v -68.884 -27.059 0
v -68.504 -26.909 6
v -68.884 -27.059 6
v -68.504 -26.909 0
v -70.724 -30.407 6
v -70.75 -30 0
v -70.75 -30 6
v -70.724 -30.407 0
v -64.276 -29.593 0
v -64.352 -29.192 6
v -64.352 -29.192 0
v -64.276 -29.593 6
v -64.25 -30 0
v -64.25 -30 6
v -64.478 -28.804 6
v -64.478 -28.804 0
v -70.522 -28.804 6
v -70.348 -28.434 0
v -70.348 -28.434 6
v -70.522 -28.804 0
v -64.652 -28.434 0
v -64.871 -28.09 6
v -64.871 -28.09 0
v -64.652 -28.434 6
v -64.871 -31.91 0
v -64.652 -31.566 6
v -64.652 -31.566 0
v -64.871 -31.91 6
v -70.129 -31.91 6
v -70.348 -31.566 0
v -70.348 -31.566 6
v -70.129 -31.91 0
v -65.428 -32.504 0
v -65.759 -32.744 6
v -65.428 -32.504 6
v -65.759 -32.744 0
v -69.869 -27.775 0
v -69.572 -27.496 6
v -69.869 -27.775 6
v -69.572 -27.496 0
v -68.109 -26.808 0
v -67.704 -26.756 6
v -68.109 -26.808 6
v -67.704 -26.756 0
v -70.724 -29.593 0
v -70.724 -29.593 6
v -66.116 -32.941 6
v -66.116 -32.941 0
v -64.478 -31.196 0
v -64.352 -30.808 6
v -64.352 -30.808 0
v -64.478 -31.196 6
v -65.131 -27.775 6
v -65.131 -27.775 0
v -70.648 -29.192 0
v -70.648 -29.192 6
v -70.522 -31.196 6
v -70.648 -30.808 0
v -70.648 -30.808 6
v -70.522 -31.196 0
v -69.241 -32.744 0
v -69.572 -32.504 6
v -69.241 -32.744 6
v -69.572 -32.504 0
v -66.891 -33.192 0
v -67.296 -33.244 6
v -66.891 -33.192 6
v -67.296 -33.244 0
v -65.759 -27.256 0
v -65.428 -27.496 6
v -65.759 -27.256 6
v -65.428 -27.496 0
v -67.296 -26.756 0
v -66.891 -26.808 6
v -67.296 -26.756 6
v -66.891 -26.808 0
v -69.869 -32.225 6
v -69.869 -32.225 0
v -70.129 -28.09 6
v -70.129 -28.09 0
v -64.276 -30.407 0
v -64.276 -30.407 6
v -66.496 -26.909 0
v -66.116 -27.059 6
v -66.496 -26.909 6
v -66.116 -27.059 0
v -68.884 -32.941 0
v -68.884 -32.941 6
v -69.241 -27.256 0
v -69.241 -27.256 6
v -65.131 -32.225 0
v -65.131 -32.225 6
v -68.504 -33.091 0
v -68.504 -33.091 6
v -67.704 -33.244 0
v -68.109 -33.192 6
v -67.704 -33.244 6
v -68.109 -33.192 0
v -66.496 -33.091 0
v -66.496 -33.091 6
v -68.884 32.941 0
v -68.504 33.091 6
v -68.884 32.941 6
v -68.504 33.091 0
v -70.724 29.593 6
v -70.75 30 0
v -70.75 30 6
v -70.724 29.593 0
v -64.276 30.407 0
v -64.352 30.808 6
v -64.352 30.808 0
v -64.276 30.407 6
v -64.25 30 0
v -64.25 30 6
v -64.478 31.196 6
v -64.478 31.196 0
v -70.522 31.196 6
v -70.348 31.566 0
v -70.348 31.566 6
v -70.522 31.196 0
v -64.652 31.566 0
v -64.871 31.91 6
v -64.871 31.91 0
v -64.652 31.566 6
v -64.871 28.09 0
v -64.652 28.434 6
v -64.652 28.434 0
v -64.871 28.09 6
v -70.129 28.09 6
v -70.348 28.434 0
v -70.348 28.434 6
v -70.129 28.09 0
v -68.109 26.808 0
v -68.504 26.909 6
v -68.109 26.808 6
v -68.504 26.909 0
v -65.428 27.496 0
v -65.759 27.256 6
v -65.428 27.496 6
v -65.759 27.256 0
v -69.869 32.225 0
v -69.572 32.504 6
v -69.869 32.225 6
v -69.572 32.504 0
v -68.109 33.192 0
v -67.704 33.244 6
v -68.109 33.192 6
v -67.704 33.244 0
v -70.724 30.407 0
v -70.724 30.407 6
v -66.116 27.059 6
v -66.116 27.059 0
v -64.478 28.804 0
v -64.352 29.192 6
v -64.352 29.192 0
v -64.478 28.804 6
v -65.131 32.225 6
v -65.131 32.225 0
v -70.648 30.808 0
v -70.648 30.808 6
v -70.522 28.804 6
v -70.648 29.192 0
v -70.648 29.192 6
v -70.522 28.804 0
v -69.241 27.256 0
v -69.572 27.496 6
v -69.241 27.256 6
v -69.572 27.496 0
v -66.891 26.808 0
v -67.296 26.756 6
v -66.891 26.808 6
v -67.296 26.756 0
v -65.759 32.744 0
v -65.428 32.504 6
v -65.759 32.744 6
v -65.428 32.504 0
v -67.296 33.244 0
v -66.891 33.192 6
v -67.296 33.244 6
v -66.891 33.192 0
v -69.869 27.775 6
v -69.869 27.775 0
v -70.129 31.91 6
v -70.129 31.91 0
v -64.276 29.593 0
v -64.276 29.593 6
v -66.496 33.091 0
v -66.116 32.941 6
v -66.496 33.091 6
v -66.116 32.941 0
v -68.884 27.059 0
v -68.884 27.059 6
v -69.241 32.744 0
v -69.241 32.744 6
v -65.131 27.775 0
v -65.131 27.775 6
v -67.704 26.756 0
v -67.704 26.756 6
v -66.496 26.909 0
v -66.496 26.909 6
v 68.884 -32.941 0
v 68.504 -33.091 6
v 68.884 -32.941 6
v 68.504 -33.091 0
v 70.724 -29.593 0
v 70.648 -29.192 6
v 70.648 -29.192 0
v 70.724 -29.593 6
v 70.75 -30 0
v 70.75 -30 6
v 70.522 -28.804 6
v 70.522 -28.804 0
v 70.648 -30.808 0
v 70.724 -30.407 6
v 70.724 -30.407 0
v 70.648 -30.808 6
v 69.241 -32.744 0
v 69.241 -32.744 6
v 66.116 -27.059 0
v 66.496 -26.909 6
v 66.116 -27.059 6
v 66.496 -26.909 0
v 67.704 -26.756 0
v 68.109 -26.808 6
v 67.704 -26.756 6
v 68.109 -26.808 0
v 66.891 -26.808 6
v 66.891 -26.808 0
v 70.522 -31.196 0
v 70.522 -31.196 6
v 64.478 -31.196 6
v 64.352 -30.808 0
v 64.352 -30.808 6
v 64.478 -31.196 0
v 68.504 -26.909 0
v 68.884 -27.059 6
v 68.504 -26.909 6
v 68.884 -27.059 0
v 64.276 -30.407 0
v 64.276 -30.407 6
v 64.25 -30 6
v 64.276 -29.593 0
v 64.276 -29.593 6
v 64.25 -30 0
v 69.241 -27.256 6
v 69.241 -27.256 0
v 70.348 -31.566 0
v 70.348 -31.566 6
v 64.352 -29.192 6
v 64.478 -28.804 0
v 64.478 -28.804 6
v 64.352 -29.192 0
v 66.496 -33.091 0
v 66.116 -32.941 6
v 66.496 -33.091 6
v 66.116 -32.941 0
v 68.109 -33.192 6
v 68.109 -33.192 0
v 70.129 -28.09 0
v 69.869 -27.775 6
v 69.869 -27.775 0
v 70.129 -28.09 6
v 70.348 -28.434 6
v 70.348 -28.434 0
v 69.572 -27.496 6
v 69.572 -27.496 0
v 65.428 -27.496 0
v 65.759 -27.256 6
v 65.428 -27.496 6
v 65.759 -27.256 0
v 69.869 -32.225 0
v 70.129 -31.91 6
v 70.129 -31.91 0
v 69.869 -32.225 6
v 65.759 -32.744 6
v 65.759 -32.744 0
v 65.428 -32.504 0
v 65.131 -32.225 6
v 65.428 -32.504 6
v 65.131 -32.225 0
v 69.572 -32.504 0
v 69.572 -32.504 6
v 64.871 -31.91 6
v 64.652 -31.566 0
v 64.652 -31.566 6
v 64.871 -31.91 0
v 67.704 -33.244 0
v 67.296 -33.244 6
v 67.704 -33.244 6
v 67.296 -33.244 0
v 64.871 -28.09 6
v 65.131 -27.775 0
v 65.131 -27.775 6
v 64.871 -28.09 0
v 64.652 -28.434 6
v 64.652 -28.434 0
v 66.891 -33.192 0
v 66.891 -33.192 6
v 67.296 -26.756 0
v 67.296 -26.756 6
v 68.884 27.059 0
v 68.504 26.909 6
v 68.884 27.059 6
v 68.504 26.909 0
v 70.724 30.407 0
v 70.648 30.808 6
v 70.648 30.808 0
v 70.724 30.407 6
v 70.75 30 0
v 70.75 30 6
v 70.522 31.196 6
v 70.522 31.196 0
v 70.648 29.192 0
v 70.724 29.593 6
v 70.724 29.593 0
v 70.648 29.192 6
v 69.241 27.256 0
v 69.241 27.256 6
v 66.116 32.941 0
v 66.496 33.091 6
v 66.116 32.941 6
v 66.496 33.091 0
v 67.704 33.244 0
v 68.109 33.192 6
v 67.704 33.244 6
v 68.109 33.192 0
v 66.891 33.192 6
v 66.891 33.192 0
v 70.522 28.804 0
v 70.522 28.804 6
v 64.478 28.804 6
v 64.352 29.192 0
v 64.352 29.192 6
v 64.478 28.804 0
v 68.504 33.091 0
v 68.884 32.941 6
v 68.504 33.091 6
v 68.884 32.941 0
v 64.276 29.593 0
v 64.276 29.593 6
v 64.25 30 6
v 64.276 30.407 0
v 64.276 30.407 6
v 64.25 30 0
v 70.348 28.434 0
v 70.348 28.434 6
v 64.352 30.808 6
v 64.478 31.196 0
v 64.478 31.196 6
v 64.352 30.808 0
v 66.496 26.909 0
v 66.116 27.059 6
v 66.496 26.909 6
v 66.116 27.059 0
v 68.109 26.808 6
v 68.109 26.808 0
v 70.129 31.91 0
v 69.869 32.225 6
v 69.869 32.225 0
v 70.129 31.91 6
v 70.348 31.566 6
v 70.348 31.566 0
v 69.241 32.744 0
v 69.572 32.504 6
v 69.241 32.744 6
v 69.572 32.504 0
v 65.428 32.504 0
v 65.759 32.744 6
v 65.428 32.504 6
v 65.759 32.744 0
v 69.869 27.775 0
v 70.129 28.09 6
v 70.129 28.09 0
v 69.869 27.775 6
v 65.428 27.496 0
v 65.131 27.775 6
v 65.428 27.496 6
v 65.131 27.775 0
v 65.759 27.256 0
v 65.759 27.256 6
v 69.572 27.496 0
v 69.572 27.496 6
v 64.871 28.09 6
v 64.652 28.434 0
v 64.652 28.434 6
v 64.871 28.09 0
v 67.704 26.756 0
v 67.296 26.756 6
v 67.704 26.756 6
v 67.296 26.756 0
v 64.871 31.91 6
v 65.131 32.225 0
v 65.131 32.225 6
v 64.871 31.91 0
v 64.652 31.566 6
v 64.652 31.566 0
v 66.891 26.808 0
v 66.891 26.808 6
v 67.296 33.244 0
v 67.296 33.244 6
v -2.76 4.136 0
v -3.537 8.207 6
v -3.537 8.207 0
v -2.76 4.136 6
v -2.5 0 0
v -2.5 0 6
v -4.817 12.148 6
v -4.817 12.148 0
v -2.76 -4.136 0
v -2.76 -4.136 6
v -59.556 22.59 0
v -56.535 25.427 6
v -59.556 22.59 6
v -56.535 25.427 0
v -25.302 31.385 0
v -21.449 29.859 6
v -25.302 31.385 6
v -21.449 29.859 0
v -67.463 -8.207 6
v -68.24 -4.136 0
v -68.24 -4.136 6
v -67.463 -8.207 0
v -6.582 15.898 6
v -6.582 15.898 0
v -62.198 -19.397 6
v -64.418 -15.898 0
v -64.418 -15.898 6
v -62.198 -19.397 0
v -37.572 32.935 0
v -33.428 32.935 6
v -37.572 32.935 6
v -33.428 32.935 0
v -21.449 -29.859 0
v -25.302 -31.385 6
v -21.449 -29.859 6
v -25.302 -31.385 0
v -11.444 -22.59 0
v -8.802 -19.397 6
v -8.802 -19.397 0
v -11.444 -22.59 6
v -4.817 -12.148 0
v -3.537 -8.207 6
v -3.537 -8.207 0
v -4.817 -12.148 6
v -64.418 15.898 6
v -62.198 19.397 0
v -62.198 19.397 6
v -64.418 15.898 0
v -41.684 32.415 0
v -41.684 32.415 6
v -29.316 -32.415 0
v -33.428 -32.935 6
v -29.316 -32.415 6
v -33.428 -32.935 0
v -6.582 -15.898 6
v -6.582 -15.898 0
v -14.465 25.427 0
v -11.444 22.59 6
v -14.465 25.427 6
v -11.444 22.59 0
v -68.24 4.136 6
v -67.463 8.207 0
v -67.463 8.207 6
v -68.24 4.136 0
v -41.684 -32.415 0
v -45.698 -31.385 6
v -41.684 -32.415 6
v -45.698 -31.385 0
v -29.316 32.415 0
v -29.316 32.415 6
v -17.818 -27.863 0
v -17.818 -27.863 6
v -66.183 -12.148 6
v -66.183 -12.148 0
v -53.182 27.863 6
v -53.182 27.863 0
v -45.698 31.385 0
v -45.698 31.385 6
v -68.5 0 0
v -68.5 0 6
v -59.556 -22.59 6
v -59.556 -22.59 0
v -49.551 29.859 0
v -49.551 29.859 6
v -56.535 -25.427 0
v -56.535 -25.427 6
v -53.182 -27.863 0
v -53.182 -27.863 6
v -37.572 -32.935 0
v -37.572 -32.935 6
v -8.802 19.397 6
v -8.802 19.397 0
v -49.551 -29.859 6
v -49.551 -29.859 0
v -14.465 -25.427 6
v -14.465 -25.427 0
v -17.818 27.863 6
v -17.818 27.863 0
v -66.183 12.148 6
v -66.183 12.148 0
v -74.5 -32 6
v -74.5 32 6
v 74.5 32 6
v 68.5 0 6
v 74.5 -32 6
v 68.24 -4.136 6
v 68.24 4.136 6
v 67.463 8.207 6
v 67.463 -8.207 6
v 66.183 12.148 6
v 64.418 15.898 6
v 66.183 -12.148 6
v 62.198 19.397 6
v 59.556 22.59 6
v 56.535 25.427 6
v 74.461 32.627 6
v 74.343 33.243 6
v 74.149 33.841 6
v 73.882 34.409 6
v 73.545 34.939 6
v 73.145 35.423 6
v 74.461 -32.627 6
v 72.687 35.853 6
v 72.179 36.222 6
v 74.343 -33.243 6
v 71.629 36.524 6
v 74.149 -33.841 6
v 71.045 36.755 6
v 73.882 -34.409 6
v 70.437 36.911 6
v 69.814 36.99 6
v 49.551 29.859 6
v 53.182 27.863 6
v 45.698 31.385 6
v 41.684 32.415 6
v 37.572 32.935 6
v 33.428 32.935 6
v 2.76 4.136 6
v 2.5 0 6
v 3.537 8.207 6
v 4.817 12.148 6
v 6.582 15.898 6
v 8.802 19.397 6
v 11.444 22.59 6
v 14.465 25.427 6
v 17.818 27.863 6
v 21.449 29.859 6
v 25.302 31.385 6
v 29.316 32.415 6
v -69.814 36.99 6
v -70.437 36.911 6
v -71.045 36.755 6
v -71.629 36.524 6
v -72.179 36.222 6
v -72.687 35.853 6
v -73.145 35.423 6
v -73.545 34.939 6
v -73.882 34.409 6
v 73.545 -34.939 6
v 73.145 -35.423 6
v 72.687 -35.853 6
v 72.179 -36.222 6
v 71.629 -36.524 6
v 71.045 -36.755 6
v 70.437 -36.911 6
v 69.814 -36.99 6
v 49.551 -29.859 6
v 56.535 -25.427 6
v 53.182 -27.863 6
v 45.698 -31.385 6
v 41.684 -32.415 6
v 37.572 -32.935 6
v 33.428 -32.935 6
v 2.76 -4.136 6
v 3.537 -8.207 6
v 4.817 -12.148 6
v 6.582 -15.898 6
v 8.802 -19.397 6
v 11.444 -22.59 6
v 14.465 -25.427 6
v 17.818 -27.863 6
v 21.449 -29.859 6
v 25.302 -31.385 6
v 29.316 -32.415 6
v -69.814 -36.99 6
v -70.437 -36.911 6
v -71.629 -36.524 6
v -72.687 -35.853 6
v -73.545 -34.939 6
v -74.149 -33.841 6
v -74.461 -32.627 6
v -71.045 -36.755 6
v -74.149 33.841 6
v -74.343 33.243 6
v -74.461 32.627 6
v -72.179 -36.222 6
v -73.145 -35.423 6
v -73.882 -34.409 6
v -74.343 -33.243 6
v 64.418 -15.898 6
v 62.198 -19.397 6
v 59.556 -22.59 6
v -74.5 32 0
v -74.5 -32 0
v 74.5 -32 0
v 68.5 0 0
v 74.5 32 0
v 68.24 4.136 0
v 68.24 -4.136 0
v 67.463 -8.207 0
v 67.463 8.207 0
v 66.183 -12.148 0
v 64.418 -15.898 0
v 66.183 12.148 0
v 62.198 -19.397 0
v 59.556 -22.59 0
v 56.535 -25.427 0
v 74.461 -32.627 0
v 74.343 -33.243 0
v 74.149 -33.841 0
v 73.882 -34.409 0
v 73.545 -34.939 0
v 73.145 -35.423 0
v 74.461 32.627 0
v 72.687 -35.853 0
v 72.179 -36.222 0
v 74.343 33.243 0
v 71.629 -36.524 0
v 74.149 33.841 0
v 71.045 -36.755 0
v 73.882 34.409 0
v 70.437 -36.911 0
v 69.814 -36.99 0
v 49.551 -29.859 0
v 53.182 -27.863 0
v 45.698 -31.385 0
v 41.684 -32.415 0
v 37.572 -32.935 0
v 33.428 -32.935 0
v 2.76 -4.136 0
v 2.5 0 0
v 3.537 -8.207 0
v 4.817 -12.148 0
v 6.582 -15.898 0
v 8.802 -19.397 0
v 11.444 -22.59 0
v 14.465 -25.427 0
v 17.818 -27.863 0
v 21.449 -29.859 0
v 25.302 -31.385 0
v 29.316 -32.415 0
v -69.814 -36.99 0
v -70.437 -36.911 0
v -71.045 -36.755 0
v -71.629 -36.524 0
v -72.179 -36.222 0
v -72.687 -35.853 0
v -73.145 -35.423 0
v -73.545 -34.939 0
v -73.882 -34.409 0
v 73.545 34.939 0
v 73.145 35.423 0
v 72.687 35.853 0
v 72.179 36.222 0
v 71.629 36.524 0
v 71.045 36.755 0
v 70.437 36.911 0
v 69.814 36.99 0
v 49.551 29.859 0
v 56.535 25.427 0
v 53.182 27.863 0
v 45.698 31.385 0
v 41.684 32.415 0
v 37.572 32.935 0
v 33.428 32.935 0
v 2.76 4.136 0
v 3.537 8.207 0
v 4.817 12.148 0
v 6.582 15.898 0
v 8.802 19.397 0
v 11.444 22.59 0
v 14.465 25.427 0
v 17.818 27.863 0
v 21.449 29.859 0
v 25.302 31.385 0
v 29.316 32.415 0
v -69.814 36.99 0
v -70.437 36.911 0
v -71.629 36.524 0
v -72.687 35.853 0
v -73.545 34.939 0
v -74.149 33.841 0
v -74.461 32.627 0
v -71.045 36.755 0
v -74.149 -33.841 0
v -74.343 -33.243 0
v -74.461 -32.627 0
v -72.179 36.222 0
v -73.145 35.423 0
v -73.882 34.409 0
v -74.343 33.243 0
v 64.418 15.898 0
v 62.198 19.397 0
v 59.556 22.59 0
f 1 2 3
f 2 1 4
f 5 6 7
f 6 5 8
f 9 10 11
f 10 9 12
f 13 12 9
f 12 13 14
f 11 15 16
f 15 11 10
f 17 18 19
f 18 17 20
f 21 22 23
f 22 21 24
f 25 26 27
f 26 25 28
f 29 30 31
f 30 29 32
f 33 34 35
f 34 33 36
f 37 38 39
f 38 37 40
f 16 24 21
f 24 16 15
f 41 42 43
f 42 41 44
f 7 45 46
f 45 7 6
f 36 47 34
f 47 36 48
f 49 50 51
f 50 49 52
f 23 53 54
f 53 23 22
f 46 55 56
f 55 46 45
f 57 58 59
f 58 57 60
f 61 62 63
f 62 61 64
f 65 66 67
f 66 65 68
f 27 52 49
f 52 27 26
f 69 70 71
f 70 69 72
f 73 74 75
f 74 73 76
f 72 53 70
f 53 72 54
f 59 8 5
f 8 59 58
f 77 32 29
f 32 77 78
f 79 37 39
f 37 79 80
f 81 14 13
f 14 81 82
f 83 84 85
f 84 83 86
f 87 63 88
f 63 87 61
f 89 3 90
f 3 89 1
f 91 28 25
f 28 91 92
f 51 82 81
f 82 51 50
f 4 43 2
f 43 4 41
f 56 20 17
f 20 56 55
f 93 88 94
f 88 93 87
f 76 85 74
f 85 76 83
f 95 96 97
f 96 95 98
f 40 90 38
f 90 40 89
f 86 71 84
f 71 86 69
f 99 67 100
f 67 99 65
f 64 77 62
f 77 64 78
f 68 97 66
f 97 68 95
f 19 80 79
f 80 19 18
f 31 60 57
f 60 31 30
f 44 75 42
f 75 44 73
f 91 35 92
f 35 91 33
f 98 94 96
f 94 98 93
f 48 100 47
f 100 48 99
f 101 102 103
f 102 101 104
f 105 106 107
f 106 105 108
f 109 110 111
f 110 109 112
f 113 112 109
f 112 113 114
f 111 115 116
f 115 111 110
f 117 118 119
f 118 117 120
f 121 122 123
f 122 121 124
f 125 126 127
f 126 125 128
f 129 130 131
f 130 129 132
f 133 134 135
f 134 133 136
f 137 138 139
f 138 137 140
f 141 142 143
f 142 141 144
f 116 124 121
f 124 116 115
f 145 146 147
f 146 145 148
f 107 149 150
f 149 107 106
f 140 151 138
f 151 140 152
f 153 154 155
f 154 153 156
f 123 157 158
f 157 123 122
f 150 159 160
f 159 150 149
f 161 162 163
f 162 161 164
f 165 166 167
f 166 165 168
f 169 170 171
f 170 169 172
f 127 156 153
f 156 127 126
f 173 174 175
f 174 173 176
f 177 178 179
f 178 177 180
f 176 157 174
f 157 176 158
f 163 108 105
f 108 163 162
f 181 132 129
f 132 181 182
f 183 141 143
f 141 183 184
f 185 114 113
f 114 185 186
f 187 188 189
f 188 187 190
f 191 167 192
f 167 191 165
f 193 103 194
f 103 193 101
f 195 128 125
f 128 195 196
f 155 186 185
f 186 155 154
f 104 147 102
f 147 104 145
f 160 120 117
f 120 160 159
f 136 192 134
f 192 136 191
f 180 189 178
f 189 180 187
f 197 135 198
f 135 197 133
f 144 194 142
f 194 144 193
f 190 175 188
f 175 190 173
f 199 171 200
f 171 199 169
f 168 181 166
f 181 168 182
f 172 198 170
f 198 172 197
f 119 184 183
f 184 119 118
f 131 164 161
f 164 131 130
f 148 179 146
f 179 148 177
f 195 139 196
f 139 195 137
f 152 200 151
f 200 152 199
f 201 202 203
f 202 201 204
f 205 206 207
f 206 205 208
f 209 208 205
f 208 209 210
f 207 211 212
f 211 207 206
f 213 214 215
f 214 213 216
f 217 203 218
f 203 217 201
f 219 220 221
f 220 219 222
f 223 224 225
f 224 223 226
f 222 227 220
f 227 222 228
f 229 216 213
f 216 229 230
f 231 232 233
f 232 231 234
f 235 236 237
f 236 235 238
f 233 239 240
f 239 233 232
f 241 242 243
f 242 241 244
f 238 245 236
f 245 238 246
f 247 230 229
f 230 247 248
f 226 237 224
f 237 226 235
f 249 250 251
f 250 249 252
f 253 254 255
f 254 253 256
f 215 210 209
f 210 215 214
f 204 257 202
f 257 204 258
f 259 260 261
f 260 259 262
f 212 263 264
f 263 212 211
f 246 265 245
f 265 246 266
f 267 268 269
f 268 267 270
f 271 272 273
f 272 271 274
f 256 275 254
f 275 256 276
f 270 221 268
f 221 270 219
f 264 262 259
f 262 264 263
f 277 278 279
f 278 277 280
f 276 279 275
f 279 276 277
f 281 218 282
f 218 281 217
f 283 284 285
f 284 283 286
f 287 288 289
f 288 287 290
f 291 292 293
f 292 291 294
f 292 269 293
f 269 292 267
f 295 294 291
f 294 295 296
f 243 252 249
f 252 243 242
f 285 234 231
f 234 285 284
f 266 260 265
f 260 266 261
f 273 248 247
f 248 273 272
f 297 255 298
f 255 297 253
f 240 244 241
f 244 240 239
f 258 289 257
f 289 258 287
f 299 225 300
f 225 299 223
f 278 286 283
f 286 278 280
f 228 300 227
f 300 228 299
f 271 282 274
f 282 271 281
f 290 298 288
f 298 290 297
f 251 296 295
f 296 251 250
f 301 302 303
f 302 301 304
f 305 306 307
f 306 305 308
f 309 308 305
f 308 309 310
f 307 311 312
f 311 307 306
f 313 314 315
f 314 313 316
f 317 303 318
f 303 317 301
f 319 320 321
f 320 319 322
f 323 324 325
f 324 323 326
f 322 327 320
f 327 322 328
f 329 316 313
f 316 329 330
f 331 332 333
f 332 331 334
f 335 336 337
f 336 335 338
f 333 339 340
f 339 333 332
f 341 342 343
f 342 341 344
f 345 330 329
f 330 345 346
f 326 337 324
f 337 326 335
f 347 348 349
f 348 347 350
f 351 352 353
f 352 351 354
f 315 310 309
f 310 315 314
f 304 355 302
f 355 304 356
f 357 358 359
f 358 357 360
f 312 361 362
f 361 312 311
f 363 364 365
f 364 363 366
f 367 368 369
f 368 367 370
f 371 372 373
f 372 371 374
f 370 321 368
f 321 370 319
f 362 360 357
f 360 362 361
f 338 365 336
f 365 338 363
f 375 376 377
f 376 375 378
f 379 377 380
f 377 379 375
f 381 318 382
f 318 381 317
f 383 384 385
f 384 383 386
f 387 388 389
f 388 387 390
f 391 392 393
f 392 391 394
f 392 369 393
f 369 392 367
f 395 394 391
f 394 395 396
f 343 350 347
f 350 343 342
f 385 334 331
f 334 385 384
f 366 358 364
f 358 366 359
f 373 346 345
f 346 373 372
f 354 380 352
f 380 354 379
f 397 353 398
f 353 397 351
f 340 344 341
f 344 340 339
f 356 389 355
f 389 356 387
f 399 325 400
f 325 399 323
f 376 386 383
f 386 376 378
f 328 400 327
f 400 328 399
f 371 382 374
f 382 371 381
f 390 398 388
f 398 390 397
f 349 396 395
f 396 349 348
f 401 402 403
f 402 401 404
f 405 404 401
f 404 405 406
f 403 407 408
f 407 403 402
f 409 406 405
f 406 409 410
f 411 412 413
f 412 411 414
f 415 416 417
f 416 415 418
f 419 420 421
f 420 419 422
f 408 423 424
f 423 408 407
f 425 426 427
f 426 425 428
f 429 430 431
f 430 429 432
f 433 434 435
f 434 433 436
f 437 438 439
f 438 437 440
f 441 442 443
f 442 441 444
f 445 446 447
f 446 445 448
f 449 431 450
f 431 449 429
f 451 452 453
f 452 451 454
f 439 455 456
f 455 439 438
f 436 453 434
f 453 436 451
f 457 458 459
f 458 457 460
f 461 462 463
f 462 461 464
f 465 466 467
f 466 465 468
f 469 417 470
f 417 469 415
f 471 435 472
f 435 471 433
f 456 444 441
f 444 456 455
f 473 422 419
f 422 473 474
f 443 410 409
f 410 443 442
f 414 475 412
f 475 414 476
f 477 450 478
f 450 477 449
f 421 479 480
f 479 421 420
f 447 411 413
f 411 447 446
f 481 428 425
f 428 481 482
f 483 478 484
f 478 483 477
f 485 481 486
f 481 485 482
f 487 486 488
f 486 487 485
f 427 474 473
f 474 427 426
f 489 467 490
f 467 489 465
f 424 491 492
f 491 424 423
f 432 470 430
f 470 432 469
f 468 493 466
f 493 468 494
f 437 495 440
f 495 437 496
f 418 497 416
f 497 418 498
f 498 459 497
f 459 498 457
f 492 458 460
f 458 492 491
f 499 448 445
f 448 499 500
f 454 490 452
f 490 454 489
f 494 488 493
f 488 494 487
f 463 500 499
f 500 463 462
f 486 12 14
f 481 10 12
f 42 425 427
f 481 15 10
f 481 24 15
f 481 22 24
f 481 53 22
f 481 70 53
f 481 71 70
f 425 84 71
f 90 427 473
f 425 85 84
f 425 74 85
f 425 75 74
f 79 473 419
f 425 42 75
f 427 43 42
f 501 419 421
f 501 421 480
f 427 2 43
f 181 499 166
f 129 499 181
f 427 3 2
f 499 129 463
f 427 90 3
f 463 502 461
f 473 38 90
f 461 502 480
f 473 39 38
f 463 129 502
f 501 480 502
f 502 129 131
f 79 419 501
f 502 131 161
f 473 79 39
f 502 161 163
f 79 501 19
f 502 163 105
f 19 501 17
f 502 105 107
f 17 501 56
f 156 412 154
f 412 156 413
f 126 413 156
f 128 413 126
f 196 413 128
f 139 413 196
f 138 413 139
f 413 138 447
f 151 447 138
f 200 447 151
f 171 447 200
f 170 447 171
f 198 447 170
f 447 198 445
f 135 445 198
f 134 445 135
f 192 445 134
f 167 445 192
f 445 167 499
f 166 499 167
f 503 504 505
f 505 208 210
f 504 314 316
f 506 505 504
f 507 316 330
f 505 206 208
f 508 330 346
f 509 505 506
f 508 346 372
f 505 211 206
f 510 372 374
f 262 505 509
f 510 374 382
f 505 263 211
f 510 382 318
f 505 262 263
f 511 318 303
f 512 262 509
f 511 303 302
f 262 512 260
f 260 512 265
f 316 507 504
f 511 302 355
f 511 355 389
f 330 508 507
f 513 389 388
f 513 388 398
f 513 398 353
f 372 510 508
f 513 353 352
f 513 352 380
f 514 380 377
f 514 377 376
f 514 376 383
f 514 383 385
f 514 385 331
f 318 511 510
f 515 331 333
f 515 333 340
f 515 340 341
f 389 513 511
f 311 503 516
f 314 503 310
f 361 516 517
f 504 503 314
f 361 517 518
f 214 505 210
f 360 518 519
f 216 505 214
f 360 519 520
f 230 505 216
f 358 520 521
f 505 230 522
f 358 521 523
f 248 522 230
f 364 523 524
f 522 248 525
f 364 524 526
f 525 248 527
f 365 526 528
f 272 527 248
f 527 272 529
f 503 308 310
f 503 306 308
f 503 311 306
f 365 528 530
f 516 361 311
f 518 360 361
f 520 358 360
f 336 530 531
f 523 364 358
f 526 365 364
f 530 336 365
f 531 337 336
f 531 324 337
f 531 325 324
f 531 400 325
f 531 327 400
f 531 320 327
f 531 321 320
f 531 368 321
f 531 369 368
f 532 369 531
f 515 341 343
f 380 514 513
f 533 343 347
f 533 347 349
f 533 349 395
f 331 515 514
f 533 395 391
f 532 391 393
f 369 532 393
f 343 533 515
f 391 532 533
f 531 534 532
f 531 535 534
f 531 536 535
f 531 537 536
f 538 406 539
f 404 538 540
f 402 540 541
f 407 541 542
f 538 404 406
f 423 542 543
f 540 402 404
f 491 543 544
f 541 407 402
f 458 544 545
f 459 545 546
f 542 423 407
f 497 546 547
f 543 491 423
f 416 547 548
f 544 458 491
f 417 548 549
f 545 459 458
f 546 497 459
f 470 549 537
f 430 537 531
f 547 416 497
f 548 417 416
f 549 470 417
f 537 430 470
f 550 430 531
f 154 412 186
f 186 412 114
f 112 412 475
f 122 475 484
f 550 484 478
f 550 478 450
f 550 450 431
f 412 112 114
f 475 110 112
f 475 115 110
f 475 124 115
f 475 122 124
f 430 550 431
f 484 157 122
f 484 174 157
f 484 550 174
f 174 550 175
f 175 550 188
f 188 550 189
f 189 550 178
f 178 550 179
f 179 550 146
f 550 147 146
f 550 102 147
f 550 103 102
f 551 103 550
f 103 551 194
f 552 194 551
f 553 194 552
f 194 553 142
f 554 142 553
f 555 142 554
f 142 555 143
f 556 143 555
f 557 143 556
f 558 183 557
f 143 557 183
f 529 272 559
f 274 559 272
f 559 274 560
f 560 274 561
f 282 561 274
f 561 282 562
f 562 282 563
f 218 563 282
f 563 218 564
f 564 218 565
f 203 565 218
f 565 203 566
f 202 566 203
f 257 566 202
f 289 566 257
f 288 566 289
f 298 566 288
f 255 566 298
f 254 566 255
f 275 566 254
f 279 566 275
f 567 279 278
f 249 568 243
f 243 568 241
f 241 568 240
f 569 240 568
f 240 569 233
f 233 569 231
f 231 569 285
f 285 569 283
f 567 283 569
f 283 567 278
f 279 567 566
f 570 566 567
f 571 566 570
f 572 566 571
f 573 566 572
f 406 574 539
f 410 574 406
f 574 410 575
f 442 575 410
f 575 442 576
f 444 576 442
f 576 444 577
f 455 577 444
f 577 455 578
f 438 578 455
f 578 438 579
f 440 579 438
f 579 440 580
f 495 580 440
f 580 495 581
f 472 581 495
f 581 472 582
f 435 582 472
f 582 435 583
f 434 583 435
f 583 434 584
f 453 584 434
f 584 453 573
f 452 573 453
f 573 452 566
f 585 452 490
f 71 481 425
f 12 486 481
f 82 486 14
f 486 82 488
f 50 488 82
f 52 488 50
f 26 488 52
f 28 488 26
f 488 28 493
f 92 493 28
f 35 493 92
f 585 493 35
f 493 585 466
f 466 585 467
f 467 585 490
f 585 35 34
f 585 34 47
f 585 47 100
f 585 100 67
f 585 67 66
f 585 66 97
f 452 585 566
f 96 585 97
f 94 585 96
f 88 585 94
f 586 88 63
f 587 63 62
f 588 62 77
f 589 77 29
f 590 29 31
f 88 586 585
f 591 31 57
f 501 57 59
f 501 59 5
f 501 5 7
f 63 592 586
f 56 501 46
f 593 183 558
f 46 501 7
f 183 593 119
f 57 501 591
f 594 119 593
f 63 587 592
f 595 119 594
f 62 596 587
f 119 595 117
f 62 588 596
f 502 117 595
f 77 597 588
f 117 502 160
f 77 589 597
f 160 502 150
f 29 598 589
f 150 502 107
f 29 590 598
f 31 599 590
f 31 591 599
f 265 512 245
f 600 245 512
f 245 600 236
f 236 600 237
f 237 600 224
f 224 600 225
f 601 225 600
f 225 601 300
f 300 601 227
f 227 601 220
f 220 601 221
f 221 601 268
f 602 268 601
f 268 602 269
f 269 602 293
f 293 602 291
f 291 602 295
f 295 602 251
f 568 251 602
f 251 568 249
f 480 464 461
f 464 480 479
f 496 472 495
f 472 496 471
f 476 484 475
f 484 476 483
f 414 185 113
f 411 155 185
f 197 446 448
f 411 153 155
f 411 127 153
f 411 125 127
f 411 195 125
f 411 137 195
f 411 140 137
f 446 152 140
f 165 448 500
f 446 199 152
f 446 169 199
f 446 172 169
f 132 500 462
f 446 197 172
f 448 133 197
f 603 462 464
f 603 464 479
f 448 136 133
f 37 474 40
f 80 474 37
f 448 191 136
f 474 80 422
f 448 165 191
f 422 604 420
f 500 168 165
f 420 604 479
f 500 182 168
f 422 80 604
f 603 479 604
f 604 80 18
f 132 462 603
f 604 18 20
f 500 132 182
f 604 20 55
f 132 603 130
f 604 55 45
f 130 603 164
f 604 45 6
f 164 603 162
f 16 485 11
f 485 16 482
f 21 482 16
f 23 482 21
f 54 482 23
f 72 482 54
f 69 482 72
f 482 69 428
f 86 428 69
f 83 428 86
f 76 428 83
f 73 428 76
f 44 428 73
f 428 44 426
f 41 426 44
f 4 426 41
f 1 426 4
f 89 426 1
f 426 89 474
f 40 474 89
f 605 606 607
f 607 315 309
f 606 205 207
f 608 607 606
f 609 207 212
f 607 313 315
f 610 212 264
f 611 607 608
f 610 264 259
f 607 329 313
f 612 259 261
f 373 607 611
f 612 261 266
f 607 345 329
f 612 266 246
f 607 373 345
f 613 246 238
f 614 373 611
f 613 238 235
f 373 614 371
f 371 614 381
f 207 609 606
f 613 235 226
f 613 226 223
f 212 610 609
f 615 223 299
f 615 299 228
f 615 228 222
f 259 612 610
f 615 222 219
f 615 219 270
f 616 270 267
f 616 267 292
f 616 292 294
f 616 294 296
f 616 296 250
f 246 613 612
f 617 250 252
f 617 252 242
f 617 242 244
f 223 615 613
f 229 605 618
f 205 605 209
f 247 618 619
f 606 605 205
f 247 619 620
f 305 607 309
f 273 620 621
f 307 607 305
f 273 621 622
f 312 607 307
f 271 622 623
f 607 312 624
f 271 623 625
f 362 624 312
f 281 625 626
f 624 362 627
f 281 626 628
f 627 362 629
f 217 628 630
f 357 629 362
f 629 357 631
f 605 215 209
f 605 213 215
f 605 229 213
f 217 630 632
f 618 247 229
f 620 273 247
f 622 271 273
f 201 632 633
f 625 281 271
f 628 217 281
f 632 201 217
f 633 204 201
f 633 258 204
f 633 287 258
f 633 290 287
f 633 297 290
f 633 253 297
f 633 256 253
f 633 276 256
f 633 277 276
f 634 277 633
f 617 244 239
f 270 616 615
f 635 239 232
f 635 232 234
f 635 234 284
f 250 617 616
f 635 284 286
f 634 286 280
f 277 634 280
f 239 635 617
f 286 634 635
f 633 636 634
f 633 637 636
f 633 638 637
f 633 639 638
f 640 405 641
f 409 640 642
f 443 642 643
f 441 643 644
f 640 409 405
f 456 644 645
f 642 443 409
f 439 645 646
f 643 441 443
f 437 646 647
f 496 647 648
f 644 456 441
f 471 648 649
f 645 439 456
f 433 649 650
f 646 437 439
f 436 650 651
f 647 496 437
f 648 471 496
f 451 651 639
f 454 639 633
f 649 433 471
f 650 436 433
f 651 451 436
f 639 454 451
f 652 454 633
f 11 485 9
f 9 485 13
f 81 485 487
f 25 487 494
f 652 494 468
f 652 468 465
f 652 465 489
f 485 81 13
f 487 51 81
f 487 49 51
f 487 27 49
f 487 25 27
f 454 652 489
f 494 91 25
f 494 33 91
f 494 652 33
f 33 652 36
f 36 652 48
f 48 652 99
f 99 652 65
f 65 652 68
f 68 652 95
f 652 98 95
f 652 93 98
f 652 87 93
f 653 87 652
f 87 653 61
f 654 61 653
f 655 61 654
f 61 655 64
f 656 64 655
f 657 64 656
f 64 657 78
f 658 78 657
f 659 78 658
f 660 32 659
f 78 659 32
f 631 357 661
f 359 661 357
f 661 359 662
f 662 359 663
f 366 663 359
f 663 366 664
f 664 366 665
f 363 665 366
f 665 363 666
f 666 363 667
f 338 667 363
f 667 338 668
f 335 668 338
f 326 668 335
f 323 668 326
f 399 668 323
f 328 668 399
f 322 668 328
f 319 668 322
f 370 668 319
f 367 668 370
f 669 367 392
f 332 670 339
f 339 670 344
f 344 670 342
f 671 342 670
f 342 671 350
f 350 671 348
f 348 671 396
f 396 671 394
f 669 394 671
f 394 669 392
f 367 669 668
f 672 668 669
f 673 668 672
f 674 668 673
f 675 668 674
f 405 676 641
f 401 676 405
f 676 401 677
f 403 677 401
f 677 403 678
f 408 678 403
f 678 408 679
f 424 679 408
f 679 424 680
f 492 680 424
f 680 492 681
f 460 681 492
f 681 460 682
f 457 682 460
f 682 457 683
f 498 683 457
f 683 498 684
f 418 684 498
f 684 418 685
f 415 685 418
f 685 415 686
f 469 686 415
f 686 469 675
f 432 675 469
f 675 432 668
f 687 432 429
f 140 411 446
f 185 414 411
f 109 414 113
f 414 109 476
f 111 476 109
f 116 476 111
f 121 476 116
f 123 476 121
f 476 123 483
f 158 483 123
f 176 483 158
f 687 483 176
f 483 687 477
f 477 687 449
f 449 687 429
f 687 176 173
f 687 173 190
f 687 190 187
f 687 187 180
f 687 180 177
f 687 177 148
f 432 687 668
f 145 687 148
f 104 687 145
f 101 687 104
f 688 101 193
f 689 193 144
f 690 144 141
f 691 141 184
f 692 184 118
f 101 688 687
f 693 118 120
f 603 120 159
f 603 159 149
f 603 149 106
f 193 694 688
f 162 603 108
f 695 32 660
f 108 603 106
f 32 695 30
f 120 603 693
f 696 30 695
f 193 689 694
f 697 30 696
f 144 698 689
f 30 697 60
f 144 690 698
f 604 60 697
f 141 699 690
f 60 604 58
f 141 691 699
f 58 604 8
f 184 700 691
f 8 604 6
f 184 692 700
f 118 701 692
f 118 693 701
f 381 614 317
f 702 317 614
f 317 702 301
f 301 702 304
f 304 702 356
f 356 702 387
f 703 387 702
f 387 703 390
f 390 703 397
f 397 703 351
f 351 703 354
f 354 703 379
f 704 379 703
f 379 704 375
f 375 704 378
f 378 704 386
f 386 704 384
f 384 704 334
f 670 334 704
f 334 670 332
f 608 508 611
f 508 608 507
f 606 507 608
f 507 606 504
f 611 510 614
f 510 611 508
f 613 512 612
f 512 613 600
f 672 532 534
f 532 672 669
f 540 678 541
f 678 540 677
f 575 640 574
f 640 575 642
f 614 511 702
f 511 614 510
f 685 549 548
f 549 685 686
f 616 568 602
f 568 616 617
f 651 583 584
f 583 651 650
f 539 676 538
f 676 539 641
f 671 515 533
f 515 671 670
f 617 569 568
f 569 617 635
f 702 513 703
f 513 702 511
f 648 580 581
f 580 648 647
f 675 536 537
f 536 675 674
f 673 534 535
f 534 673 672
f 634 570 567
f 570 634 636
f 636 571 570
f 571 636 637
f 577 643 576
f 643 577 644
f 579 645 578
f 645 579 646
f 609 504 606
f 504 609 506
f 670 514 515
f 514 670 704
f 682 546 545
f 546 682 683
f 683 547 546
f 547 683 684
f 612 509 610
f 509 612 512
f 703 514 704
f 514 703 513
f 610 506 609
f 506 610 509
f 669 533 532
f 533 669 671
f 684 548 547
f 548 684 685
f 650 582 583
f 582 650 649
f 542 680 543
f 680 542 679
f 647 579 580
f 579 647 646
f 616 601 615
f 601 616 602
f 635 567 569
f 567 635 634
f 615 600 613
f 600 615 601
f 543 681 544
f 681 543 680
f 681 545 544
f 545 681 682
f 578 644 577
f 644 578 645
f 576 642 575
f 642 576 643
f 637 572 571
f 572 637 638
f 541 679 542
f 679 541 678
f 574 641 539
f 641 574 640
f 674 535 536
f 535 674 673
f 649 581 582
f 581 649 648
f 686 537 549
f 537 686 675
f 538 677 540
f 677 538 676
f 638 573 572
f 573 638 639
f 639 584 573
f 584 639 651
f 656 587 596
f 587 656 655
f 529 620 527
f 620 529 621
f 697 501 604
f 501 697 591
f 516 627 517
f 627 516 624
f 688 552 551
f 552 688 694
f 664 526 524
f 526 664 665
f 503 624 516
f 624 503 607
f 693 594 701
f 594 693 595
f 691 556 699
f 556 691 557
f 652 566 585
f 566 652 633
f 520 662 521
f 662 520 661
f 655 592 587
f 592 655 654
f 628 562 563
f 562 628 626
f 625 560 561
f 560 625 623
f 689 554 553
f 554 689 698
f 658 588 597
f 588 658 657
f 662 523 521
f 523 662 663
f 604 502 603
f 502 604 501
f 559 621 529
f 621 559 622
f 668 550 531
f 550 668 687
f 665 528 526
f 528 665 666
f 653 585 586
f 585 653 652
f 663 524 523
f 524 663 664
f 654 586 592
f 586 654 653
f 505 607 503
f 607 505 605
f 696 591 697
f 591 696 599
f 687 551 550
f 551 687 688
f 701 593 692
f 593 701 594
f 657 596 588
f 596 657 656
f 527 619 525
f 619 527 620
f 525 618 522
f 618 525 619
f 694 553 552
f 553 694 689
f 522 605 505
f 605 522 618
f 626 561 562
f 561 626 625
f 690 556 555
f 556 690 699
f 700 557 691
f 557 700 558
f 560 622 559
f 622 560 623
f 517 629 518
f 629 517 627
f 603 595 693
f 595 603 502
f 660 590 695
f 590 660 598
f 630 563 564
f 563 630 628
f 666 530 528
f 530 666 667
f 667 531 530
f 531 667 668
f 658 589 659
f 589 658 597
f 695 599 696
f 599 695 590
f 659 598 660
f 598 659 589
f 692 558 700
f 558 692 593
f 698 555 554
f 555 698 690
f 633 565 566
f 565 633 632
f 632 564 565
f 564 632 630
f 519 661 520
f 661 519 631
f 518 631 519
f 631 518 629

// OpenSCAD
$fn = 50;

difference() {
	union() {
		hull() {
			translate(v = [-69.5, 32.0, 0]) {
				cylinder(h = 6, r = 5);
			}
			translate(v = [69.5, 32.0, 0]) {
				cylinder(h = 6, r = 5);
			}
			translate(v = [-69.5, -32.0, 0]) {
				cylinder(h = 6, r = 5);
			}
			translate(v = [69.5, -32.0, 0]) {
				cylinder(h = 6, r = 5);
			}
		}
	}
	union() {
		translate(v = [-67.5, -30.0, -100.0]) {
			cylinder(h = 200, r = 3.25);
		}
		translate(v = [-67.5, 30.0, -100.0]) {
			cylinder(h = 200, r = 3.25);
		}
		translate(v = [67.5, -30.0, -100.0]) {
			cylinder(h = 200, r = 3.25);
		}
		translate(v = [67.5, 30.0, -100.0]) {
			cylinder(h = 200, r = 3.25);
		}
		translate(v = [-67.5, -30.0, -100.0]) {
			cylinder(h = 200, r = 1.8);
		}
		translate(v = [-67.5, 30.0, -100.0]) {
			cylinder(h = 200, r = 1.8);
		}
		translate(v = [67.5, -30.0, -100.0]) {
			cylinder(h = 200, r = 1.8);
		}
		translate(v = [67.5, 30.0, -100.0]) {
			cylinder(h = 200, r = 1.8);
		}
		translate(v = [-35.5, 0, 0.0]) {
			cylinder(h = 6, r = 33.0);
		}
		translate(v = [35.5, 0, 0.0]) {
			cylinder(h = 6, r = 33.0);
		}
	}
}
